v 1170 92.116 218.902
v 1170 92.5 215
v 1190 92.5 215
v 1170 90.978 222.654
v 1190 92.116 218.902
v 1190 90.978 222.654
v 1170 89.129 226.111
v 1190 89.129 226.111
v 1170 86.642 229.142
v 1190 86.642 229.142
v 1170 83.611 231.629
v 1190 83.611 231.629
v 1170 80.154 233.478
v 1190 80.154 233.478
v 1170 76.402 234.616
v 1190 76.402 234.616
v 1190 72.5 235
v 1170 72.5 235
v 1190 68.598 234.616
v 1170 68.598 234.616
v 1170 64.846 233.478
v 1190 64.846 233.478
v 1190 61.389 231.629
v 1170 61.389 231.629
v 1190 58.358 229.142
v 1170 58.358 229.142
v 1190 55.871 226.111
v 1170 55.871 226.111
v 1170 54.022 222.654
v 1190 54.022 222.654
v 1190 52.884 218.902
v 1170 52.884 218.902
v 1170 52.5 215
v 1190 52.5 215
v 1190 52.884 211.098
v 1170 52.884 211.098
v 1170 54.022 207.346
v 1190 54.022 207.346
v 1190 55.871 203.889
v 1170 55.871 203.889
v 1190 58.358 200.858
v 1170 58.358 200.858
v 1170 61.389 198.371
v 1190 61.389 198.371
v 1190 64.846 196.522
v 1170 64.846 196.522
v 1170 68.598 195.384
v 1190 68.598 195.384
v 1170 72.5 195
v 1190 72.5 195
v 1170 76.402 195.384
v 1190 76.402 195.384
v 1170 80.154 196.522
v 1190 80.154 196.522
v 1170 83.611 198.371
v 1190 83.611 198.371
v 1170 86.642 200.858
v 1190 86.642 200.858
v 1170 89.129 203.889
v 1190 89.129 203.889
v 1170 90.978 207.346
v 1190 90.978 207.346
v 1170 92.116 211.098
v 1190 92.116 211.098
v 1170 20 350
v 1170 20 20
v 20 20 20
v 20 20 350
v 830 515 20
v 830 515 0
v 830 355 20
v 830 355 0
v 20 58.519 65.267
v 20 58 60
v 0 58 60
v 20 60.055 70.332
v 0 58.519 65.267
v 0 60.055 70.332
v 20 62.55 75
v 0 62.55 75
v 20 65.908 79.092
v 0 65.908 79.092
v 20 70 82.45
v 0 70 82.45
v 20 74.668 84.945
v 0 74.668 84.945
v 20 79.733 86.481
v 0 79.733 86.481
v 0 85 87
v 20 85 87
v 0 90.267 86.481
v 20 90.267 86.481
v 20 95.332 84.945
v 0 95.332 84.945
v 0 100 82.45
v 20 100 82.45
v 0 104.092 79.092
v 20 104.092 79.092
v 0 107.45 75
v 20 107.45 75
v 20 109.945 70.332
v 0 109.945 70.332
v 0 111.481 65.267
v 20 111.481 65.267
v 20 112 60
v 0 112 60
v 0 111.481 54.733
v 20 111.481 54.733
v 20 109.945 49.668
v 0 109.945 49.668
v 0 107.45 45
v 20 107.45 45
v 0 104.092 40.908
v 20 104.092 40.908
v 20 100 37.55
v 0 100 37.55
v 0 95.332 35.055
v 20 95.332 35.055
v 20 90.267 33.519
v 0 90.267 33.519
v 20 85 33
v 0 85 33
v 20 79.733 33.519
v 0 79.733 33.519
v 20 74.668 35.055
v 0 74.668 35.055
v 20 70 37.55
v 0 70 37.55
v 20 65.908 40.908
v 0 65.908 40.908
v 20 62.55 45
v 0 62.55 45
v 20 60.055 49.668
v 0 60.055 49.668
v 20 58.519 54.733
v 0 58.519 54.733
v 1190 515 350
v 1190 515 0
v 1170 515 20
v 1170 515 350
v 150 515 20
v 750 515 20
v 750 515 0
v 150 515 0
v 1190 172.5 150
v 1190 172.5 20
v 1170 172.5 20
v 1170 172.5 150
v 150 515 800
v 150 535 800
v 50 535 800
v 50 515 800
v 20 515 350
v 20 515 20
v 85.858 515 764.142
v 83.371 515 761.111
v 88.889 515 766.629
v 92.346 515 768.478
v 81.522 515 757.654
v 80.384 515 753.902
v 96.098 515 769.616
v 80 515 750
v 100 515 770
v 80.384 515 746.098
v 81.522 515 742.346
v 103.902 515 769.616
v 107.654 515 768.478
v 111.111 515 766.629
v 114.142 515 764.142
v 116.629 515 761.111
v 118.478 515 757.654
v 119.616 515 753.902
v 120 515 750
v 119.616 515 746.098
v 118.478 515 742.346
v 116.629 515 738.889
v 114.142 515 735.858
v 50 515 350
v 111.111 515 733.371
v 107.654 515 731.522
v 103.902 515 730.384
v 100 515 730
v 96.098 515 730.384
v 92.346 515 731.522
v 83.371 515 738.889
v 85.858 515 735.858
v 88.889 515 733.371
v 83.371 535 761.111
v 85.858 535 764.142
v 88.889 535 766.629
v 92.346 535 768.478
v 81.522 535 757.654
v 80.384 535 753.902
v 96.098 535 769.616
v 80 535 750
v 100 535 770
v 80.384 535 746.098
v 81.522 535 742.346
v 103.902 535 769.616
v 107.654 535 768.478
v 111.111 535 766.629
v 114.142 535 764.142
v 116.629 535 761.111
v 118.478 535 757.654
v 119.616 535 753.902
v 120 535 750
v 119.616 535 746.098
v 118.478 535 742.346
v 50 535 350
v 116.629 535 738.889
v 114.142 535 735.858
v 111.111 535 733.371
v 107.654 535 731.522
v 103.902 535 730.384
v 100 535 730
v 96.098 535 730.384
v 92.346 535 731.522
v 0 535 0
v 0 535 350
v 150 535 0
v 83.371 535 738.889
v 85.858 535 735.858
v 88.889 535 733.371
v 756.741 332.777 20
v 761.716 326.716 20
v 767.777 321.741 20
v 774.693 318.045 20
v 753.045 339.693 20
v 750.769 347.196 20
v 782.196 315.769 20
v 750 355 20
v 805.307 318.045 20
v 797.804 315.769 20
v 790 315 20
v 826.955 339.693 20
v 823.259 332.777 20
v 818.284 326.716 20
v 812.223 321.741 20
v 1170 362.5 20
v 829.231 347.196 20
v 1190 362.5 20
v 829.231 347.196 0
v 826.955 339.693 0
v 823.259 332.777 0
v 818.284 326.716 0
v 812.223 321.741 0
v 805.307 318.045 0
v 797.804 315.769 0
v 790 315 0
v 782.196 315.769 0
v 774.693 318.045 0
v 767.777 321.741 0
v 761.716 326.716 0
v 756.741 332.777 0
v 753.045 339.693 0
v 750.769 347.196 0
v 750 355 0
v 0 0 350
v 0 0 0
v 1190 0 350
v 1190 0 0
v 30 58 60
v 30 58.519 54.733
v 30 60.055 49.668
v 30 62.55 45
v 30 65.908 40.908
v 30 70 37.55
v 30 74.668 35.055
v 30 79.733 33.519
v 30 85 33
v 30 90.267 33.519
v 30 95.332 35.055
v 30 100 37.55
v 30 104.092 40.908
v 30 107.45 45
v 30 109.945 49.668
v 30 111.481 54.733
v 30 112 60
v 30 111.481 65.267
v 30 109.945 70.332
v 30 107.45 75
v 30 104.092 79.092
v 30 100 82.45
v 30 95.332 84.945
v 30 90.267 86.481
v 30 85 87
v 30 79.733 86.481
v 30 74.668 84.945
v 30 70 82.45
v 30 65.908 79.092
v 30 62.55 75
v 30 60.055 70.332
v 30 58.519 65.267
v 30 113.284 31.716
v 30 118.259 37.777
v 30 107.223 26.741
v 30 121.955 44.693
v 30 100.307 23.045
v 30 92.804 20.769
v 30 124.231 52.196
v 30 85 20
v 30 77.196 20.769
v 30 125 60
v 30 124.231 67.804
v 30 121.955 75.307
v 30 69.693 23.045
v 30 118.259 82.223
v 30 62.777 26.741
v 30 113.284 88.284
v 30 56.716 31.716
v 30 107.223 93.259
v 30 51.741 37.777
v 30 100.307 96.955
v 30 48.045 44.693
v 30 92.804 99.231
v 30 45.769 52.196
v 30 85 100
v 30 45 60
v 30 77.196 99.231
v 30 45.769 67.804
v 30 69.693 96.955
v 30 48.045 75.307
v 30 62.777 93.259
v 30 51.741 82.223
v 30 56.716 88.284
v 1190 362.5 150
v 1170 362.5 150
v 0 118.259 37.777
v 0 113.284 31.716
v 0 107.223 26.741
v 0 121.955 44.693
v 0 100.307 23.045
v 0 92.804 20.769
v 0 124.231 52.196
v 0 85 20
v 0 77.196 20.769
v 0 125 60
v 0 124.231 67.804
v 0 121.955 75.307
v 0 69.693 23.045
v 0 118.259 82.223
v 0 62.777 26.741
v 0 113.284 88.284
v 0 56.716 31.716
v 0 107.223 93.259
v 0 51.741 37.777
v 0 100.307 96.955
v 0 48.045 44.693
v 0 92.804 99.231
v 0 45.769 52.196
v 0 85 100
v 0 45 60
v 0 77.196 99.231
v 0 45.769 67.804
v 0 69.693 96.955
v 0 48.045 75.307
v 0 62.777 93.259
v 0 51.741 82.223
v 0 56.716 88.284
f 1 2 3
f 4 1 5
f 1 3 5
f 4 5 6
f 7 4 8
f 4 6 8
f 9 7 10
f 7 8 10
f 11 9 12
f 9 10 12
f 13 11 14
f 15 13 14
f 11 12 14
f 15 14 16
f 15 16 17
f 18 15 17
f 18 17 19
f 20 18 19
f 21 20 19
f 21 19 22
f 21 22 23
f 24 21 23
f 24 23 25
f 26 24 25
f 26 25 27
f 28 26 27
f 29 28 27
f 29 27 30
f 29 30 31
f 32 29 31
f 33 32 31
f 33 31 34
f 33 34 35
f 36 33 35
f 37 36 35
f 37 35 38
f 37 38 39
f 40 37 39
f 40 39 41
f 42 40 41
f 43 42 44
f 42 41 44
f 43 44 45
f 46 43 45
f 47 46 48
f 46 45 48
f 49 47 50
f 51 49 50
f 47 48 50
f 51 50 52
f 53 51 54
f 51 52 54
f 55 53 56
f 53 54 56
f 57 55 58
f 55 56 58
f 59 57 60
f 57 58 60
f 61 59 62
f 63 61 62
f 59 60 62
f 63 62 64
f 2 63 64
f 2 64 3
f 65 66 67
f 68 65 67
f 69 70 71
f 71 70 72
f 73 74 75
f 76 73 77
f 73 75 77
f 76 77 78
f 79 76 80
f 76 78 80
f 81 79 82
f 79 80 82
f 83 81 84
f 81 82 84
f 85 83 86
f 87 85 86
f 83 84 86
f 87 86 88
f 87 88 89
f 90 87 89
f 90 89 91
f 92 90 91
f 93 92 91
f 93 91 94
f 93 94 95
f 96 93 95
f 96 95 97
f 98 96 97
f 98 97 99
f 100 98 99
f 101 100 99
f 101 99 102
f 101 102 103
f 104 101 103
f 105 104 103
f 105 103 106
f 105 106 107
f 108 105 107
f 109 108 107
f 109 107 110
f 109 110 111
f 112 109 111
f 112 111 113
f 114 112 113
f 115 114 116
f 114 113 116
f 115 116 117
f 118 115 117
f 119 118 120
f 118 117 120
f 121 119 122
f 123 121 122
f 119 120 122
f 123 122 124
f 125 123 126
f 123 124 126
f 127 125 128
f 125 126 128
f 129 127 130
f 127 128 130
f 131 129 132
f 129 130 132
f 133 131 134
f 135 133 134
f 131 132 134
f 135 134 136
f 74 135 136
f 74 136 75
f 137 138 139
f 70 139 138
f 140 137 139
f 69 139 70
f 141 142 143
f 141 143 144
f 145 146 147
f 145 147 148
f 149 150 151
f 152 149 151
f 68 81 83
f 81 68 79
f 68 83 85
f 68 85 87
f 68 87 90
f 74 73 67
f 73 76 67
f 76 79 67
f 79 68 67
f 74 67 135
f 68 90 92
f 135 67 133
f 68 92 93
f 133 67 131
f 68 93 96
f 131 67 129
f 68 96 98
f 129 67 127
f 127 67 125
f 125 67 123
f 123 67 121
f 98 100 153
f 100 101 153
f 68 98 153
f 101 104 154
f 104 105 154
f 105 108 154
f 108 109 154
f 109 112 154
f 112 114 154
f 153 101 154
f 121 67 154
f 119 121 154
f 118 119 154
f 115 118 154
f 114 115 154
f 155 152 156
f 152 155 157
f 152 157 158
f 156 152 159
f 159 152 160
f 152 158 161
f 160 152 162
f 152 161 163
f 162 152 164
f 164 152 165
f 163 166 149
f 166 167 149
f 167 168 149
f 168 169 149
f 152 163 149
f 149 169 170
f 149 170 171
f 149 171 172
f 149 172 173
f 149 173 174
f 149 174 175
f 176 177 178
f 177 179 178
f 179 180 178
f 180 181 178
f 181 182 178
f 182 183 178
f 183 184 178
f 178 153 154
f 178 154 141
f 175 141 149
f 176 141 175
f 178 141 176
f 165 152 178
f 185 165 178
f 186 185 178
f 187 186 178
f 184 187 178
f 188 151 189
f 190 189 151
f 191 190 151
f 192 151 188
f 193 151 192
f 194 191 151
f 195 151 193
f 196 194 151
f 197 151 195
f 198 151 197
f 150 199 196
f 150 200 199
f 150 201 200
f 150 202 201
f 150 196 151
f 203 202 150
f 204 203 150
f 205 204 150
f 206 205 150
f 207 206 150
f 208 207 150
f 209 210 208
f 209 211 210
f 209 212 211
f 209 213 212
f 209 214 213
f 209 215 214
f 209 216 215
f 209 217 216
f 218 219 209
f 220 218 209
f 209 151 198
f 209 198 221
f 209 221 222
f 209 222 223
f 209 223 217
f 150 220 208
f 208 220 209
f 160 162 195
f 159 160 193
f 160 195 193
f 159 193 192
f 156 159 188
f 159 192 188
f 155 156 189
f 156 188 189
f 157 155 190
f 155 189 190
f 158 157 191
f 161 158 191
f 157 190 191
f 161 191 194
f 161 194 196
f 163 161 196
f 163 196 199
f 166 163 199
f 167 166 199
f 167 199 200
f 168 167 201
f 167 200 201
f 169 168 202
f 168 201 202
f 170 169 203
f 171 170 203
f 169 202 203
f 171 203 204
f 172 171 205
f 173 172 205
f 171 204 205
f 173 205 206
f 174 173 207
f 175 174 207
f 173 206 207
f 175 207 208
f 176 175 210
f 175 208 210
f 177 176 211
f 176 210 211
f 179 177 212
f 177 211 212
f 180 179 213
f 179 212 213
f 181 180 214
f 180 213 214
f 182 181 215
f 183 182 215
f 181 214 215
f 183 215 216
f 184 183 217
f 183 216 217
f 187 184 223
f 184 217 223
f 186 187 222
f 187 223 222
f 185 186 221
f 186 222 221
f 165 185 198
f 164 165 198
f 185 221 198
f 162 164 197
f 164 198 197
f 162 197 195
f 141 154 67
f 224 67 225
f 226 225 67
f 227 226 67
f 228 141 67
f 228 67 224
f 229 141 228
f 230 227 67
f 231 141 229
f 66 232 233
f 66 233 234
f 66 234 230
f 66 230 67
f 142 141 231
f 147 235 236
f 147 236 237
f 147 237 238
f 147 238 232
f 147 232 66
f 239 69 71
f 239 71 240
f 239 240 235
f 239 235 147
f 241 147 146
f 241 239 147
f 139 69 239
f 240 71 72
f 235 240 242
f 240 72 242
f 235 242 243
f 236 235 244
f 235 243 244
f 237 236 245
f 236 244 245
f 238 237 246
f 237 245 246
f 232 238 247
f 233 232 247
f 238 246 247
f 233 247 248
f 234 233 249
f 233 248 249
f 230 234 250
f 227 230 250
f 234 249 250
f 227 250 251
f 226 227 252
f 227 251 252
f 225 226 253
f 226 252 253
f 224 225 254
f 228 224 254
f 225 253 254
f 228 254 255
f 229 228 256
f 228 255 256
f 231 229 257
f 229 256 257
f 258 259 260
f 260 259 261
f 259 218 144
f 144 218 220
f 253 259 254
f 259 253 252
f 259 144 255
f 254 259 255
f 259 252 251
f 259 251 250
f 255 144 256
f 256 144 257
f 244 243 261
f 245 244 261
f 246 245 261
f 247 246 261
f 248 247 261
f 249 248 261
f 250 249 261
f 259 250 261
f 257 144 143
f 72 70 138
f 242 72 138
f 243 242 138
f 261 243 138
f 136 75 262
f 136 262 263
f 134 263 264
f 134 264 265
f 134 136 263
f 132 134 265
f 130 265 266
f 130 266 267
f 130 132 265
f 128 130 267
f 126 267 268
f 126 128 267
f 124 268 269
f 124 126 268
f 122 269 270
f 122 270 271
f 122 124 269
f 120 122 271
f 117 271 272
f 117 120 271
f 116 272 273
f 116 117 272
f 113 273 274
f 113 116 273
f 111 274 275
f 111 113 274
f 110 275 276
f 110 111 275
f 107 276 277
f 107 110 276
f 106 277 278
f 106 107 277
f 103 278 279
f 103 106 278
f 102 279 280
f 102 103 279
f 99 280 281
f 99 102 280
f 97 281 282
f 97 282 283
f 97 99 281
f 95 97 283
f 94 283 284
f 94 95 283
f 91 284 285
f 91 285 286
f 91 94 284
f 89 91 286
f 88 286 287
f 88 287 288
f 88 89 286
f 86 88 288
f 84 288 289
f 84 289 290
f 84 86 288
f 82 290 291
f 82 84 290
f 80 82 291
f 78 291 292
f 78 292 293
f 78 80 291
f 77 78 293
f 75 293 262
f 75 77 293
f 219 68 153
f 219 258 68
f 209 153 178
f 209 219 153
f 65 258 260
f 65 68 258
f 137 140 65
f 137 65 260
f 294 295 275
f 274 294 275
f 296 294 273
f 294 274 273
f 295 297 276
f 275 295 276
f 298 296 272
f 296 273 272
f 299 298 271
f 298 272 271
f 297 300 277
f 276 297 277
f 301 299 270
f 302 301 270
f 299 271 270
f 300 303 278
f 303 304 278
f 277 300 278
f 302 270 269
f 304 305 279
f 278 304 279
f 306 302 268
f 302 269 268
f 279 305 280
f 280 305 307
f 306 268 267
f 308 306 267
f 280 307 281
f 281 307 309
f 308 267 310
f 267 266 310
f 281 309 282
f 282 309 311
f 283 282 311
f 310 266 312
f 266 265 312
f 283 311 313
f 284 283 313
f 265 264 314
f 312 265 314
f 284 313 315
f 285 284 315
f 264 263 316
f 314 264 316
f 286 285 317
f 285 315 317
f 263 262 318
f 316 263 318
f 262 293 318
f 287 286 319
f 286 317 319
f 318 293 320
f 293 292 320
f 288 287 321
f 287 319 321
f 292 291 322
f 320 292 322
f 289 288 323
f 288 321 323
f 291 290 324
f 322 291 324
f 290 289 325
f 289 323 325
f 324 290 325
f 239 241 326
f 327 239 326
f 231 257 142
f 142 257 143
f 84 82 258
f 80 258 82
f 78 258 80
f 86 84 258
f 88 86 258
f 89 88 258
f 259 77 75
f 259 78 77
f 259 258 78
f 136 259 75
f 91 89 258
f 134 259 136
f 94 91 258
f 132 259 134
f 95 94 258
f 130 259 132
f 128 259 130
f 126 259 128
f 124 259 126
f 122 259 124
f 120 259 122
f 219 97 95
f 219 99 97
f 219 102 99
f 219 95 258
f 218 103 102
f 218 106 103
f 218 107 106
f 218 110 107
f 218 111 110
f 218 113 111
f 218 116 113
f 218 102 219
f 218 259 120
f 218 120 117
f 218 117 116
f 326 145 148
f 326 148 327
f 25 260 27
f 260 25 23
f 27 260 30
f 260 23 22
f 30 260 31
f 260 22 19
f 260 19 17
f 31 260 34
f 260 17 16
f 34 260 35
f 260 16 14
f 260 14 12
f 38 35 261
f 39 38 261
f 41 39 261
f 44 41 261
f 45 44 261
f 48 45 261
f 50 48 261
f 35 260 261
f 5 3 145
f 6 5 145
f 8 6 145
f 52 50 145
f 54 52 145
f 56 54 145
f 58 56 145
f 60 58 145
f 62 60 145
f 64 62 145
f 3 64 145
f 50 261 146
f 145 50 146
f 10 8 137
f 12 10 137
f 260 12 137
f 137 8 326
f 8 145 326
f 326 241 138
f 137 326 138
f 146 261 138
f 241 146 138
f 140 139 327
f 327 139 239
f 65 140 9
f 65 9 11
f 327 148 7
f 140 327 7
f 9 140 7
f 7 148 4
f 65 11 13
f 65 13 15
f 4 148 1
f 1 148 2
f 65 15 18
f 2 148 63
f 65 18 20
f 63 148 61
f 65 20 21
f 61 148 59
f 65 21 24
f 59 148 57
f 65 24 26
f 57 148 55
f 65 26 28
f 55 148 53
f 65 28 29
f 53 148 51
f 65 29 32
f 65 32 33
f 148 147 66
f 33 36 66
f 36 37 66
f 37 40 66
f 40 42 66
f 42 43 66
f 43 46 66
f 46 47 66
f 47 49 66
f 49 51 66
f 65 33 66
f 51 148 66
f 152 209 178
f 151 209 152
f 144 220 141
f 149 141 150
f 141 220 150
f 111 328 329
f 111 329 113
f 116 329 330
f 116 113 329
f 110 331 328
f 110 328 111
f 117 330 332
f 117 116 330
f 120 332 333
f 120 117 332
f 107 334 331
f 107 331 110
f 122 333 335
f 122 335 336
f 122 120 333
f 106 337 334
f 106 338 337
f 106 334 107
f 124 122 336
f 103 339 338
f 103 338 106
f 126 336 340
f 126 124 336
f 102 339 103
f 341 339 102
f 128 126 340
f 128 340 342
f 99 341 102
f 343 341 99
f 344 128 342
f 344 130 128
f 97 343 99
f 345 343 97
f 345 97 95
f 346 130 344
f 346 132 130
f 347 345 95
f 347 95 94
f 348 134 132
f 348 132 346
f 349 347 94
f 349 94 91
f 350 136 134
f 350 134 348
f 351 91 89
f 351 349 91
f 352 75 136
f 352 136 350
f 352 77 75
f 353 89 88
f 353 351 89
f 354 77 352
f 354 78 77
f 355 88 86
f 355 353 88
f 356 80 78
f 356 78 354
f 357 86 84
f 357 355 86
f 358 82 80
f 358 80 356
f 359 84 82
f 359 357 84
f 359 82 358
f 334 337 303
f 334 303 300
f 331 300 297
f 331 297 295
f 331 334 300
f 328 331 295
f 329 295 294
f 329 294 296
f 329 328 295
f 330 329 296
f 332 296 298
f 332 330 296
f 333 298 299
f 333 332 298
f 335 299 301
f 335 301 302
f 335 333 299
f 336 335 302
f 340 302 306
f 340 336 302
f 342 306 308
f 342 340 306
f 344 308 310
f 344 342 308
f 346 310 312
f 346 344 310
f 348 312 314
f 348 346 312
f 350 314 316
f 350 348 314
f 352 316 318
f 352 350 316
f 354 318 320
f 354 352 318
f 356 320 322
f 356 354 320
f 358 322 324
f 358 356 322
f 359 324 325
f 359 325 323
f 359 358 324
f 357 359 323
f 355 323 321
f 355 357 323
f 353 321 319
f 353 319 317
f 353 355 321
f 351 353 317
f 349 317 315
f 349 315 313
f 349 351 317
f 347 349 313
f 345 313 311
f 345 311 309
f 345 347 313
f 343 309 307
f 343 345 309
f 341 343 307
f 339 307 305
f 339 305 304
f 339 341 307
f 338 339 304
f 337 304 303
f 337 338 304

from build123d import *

# Parameters (mm, degrees)
F0_W      = 1190
F0_H      = 535
F1_DEPTH  = 350
F2_DEPTH  = 20
F3_R      = 20
F4_DEPTH  = 25
F5_W      = 100
F5_H      = 450
F5_R      = 20
F6_DEPTH  = 20
F8_DEPTH  = 50
F9_DEPTH  = 30
F5_W_2    = 1040
F5_H_2    = 350
F10_DEPTH = 20
F3_W      = 190
F3_H      = 130
F11_DEPTH = 20


with BuildPart() as f1:
    # F0 (on Top) → F1 (new body)
    with BuildSketch(Plane.XY):
        with Locations((595, 267.5)):
            Rectangle(F0_W, F0_H)
        Polygon((20, 20), (20, 515), (750, 515), (830, 515), (1170, 515), (1170, 20), align=None, mode=Mode.SUBTRACT)
    extrude(amount=F1_DEPTH)

    # F0 (on Top) → F2 (join)
    with BuildSketch(Plane.XY):
        with BuildLine():
            Line((750, 515), (20, 515))
            Line((20, 515), (20, 20))
            Line((20, 20), (1170, 20))
            Line((1170, 20), (1170, 515))
            Line((1170, 515), (830, 515))
            Line((830, 515), (830, 355))
            ThreePointArc((830, 355), (790, 315), (750, 355))
            Line((750, 355), (750, 515))
        make_face()
    extrude(amount=F2_DEPTH)

    # F3 (on face) → F4 (cut)
    with BuildSketch(Plane.YZ.offset(1190)):
        with Locations((72.5, 215)):
            Circle(F3_R)
    extrude(amount=-F4_DEPTH, mode=Mode.SUBTRACT)

    # F5 (on face) → F6 (join)
    with BuildSketch(Plane(origin=(0, 535, 0), x_dir=(-1, 0, 0), z_dir=(0, 1, 0))):
        with Locations((-100, 575)):
            Rectangle(F5_W, F5_H)
        with Locations((-100, 750)):
            Circle(F5_R, mode=Mode.SUBTRACT)
    extrude(amount=-F6_DEPTH)

    # F7 (on face) → F8 (cut)
    with BuildSketch(Plane(origin=(0, 0, 0), x_dir=(0, -1, 0), z_dir=(-1, 0, 0))):
        with BuildLine():
            ThreePointArc((-112, 60), (-85, 33), (-58, 60))
            ThreePointArc((-58, 60), (-85, 87), (-112, 60))
        make_face()
    extrude(amount=-F8_DEPTH, mode=Mode.SUBTRACT)

    # F5 (on face) → F10 (cut)
    with BuildSketch(Plane(origin=(0, 535, 0), x_dir=(-1, 0, 0), z_dir=(0, 1, 0))):
        with Locations((-670, 175)):
            Rectangle(F5_W_2, F5_H_2)
    extrude(amount=-F10_DEPTH, mode=Mode.SUBTRACT)

    # F3 (on face) → F11 (cut)
    with BuildSketch(Plane.YZ.offset(1190)):
        with Locations((267.5, 85)):
            Rectangle(F3_W, F3_H)
    extrude(amount=-F11_DEPTH, mode=Mode.SUBTRACT)


with BuildPart() as f9:
    # F7 (on face) → F9 (new body)
    with BuildSketch(Plane(origin=(0, 0, 0), x_dir=(0, -1, 0), z_dir=(-1, 0, 0))):
        with BuildLine():
            ThreePointArc((-45, 60), (-85, 100), (-125, 60))
            ThreePointArc((-125, 60), (-85, 20), (-45, 60))
        make_face()
        with BuildLine():
            ThreePointArc((-112, 60), (-85, 87), (-58, 60))
            ThreePointArc((-58, 60), (-85, 33), (-112, 60))
        make_face(mode=Mode.SUBTRACT)
    extrude(amount=-F9_DEPTH)


solid = Compound([f1.part, f9.part])
